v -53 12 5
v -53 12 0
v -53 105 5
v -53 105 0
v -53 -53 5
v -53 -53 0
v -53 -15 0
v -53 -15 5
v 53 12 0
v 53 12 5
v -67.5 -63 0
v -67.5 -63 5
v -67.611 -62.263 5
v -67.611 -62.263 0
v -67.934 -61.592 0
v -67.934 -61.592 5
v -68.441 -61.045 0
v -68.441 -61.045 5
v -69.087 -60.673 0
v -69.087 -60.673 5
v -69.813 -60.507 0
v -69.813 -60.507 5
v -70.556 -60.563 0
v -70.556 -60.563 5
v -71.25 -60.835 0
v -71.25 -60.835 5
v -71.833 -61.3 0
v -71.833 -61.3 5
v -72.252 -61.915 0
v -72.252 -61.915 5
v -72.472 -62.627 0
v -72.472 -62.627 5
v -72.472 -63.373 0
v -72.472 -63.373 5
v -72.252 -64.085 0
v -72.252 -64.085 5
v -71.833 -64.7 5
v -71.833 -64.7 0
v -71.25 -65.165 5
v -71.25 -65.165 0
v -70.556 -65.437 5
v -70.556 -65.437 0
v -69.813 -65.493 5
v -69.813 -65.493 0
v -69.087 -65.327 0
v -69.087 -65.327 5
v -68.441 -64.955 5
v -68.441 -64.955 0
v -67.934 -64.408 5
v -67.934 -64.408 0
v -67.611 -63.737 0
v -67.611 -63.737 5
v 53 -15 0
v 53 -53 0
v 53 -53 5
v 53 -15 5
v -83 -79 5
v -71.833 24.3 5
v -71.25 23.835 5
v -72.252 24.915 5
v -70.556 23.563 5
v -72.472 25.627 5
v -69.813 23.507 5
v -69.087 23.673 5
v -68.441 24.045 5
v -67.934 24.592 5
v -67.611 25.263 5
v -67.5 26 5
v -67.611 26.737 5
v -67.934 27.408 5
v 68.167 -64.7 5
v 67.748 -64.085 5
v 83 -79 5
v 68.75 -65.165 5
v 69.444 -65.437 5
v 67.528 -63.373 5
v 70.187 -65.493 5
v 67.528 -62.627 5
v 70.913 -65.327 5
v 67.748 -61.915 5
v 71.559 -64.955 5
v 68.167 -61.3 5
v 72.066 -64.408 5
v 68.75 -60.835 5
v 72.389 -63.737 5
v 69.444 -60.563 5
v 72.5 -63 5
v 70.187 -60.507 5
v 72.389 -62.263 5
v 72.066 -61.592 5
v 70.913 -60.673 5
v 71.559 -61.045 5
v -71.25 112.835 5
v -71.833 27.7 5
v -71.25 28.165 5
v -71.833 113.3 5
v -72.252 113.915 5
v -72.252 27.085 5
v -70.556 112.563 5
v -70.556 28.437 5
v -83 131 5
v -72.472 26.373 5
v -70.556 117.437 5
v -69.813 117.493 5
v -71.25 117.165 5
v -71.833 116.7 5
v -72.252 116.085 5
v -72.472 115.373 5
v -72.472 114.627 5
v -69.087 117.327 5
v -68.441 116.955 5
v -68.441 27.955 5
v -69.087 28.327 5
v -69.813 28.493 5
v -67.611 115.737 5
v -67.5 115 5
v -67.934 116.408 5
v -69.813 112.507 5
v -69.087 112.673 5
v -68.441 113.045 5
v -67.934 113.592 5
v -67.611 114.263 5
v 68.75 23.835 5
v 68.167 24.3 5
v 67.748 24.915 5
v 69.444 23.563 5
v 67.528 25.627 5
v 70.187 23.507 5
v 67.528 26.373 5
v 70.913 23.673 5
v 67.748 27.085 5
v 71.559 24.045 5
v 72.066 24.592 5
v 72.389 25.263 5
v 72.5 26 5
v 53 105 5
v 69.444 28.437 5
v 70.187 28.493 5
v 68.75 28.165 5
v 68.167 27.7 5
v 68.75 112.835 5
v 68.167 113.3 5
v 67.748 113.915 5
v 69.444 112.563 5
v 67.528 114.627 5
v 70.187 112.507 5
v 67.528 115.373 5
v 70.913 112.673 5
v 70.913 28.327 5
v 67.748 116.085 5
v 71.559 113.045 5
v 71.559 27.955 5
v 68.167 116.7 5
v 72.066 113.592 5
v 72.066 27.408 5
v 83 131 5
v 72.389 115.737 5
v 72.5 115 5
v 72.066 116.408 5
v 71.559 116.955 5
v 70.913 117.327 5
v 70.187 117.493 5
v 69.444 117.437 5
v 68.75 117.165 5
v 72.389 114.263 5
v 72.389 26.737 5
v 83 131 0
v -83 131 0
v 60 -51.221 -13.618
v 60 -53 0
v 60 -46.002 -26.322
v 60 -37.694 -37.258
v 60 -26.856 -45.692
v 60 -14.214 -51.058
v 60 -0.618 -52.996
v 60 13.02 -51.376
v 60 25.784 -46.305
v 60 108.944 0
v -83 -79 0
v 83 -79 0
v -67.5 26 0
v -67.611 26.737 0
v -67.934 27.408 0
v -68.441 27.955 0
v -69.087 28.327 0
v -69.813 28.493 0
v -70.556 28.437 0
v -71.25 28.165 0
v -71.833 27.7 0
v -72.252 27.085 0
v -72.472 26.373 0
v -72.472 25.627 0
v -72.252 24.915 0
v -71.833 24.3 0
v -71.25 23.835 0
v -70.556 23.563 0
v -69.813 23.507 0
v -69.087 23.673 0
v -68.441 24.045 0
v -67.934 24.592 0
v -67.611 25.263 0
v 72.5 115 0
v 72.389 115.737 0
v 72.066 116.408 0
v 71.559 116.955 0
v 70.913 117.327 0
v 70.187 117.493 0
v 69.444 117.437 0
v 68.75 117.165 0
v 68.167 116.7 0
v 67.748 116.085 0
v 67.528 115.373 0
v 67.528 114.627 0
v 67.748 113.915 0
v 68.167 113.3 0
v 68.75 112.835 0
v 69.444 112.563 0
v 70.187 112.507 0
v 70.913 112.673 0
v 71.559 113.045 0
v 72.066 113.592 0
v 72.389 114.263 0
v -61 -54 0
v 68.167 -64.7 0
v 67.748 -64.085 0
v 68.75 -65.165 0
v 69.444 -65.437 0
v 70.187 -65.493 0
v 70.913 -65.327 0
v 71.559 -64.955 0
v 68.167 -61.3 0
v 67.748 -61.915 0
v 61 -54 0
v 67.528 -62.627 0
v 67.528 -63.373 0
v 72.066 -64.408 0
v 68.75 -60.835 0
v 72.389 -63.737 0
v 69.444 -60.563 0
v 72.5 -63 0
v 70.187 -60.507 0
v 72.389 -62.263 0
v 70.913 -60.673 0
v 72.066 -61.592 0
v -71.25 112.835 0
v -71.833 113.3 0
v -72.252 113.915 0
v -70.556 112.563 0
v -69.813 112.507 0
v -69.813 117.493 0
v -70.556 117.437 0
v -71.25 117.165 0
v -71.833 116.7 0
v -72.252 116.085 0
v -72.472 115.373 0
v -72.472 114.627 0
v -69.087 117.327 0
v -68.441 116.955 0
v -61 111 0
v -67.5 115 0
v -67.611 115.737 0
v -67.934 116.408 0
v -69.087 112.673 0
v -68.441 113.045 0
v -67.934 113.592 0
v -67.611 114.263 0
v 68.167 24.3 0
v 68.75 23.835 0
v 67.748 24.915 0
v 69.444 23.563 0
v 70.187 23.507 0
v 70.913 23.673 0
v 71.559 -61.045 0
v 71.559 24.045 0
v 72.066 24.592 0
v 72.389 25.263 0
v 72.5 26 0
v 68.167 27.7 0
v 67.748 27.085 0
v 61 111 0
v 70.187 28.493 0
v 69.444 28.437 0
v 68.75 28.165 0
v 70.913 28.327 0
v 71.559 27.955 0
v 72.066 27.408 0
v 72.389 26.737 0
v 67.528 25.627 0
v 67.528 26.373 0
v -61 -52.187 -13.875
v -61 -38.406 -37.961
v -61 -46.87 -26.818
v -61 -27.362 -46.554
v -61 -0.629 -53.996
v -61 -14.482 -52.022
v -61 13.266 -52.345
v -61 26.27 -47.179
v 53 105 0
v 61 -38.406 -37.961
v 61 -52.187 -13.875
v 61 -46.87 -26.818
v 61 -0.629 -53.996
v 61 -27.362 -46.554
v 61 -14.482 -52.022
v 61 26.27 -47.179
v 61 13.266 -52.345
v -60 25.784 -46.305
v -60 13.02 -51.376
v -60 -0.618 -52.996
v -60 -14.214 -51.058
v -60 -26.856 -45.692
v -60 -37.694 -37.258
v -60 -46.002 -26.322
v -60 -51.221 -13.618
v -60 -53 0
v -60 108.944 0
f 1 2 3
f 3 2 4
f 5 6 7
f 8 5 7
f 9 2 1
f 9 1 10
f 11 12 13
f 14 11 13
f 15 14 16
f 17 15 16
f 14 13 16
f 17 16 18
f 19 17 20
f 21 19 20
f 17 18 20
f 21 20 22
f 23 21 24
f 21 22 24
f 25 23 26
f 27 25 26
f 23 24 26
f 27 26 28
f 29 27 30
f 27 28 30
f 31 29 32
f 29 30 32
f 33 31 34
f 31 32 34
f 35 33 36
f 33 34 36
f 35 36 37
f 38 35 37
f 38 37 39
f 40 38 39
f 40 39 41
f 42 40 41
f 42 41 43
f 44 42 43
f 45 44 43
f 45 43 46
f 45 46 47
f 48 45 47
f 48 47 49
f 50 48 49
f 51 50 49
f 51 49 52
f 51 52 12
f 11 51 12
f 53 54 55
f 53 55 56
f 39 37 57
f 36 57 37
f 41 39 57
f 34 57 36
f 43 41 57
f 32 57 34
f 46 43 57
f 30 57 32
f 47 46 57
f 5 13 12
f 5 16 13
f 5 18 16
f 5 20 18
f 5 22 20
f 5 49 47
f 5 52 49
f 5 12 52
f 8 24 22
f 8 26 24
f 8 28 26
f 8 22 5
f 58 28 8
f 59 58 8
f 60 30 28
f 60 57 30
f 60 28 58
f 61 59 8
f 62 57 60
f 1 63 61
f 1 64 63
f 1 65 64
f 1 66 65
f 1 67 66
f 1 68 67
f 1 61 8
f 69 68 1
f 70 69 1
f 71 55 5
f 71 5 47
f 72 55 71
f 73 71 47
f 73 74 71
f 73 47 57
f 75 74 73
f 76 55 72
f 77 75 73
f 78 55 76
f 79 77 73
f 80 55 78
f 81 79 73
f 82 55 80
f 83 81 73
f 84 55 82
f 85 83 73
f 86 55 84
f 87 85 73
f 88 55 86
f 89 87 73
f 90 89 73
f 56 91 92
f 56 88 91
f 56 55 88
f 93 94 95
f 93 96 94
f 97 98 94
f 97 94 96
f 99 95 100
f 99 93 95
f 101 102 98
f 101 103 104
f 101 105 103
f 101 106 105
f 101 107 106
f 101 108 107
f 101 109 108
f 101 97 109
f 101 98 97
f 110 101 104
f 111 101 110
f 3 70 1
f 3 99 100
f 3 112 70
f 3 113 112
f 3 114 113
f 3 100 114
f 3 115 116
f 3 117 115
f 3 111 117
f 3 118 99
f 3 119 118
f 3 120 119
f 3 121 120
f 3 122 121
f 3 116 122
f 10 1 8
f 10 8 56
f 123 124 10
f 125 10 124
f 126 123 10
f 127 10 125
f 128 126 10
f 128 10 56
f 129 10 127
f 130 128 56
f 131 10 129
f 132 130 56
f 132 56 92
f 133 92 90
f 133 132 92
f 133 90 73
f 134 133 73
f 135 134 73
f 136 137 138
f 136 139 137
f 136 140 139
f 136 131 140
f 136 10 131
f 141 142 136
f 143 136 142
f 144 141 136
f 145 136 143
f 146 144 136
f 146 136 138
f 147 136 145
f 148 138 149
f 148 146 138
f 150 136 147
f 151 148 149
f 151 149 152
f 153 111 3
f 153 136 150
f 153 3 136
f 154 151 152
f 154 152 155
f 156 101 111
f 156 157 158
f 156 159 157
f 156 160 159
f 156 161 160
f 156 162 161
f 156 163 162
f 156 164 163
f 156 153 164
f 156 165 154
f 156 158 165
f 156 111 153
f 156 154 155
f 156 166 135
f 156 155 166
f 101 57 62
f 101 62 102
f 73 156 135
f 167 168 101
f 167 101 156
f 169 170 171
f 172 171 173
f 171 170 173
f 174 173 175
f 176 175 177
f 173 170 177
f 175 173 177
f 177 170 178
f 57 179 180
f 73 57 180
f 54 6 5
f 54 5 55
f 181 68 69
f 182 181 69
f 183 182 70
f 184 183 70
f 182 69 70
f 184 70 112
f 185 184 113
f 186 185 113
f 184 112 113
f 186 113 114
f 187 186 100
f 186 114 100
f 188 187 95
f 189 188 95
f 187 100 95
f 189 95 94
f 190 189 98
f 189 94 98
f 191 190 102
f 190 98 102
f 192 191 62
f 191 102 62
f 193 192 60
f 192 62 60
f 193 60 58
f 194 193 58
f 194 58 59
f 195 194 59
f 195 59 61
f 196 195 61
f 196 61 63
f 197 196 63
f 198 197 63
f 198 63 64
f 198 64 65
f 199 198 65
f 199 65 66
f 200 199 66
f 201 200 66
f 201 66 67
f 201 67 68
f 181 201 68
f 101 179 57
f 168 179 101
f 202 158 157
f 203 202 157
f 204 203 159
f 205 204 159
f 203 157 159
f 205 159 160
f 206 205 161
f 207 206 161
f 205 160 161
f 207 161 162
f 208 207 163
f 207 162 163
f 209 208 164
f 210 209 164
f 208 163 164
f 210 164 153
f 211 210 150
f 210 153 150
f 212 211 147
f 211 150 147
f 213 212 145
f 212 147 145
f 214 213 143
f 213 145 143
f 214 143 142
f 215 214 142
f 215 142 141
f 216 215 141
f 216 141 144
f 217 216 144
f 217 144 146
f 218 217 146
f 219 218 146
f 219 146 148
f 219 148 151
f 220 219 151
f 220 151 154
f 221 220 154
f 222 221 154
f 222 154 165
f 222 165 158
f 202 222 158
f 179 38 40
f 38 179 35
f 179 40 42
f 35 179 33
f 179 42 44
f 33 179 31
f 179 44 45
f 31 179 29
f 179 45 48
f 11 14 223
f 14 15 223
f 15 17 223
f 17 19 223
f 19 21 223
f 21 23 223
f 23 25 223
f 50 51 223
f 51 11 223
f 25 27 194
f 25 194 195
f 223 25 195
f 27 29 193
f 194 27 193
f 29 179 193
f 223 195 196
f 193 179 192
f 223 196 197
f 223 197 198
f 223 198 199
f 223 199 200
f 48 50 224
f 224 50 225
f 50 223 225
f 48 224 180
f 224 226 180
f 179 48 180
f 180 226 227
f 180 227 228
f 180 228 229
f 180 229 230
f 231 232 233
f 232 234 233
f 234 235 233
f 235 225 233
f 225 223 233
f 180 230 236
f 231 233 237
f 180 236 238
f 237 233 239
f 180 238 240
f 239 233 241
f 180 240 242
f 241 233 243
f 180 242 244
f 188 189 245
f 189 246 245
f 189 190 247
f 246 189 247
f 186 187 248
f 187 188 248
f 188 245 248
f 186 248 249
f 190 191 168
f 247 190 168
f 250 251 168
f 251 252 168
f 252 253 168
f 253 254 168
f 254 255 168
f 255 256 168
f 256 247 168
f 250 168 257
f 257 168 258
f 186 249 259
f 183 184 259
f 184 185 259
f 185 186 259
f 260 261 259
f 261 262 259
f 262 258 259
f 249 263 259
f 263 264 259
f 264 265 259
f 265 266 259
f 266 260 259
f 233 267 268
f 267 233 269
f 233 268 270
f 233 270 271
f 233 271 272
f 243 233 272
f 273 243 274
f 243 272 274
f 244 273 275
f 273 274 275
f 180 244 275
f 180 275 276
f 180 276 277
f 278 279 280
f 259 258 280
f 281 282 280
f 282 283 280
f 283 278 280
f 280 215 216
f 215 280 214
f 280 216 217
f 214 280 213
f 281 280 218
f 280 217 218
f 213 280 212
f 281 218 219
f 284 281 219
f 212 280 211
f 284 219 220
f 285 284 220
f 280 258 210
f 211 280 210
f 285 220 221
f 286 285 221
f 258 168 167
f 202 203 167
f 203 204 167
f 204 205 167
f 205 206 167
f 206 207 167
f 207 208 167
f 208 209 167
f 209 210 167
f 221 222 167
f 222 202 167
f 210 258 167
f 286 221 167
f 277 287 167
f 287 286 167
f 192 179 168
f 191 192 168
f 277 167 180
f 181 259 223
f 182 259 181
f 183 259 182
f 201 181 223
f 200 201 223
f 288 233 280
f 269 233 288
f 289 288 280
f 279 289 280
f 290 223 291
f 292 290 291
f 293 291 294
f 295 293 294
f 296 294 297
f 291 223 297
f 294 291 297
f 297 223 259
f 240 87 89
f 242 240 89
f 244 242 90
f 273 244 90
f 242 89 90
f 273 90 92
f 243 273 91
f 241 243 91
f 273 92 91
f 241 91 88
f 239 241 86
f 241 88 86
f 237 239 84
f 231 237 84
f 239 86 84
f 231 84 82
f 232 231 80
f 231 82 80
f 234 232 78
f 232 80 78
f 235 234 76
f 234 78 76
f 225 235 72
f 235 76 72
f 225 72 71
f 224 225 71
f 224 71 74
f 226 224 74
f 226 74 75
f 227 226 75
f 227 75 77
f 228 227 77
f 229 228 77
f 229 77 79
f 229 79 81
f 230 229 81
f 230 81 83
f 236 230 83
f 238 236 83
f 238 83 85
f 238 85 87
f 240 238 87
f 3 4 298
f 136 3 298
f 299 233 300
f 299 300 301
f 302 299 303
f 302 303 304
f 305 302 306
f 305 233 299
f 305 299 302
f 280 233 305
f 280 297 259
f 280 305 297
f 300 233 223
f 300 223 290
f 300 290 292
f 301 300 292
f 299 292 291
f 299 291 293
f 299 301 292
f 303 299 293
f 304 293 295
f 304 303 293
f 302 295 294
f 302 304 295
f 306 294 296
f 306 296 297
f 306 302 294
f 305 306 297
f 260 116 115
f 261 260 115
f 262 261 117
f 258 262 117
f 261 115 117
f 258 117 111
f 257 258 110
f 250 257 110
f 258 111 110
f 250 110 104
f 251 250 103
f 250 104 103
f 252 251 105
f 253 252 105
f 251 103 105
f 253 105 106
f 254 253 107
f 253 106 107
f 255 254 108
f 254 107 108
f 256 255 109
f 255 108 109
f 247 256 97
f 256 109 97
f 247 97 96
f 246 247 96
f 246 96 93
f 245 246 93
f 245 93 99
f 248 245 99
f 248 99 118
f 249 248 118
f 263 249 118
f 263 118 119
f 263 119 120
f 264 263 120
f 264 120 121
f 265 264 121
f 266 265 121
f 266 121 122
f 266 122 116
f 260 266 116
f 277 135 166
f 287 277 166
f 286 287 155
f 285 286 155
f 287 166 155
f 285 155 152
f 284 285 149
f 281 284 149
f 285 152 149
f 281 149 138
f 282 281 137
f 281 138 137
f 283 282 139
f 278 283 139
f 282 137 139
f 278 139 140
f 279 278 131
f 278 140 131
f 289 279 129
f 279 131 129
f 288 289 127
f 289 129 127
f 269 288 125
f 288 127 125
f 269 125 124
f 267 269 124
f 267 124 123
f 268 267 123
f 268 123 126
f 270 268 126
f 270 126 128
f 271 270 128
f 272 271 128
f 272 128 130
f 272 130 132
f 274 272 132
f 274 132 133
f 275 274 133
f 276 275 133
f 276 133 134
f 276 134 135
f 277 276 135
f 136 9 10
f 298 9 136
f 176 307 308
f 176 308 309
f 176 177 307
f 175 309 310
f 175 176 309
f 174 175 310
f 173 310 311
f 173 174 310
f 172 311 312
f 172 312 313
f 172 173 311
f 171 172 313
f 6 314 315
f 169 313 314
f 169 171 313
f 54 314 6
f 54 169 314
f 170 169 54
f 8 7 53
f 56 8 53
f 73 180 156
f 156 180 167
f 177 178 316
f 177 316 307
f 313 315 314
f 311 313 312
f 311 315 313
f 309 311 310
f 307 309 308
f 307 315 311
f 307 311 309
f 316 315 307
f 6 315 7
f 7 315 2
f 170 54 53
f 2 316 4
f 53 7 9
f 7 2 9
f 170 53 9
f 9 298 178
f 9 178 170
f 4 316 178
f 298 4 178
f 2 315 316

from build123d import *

# Parameters (mm, degrees)
EXTRU_MINCE1_DEPTH      = 60
BOSS_EXTRU_1_START      = 1
BOSS_EXTRU_1_DEPTH      = 1
BOSS_EXTRU_2_DEPTH      = 1
ESQUISSE4_W             = 166
ESQUISSE4_H             = 210
ESQUISSE4_W_2           = 106
ESQUISSE4_H_2           = 93
ESQUISSE4_H_3           = 38
BOSS_EXTRU_3_DEPTH      = 5
ESQUISSE5_R             = 2.5
ENL_V_MAT_EXTRU_1_DEPTH = 166.924681708


with BuildPart() as part:
    # Esquisse1 → Extru.-Mince1 (new, symmetric)
    with BuildSketch(Plane(origin=(0, 0, 0), x_dir=(0, 0, -1), z_dir=(1, 0, 0))):
        with BuildLine():
            ThreePointArc((0, -54), (46.554240379, -27.362432324), (47.179157474, 26.27027027))
            Line((47.179157474, 26.27027027), (0, 111))
            Line((0, 111), (-0.873688101, 110.513513514))
            Line((-0.873688101, 110.513513514), (46.305469372, 25.783783784))
            ThreePointArc((46.305469372, 25.783783784), (45.692124817, -26.855720615), (0, -53))
            Line((0, -53), (0, -54))
        make_face()
    extrude(amount=EXTRU_MINCE1_DEPTH, both=True)

    # Esquisse2 → Boss.-Extru.1 (add)
    with BuildSketch(Plane(origin=(60, 0, 0), x_dir=(0, 0, -1), z_dir=(1, 0, 0)).offset(BOSS_EXTRU_1_START)):
        with BuildLine():
            Line((0, 111), (0, -54))
            ThreePointArc((0, -54), (46.554240379, -27.362432324), (47.179157474, 26.27027027))
            Line((47.179157474, 26.27027027), (0, 111))
        make_face()
    extrude(amount=-BOSS_EXTRU_1_DEPTH)

    # Esquisse3 → Boss.-Extru.2 (add)
    with BuildSketch(Plane.ZY.offset(60)):
        with BuildLine():
            Line((0, 111), (0, -54))
            ThreePointArc((0, -54), (-46.554240379, -27.362432324), (-47.179157474, 26.27027027))
            Line((-47.179157474, 26.27027027), (0, 111))
        make_face()
    extrude(amount=BOSS_EXTRU_2_DEPTH)

    # Esquisse4 → Boss.-Extru.3 (add)
    with BuildSketch(Plane.XY):
        with Locations((0, 26)):
            Rectangle(ESQUISSE4_W, ESQUISSE4_H)
        with Locations((0, 58.5)):
            Rectangle(ESQUISSE4_W_2, ESQUISSE4_H_2, mode=Mode.SUBTRACT)
        with Locations((0, -34)):
            Rectangle(ESQUISSE4_W_2, ESQUISSE4_H_3, mode=Mode.SUBTRACT)
    extrude(amount=BOSS_EXTRU_3_DEPTH)

    # Esquisse5 → Enlèv. mat.-Extru.1 (cut, through all)
    with BuildSketch(Plane.XY.offset(5)):
        with Locations((-70, 115)):
            Circle(ESQUISSE5_R)
        with Locations((-70, 26)):
            Circle(ESQUISSE5_R)
        with Locations((-70, -63)):
            Circle(ESQUISSE5_R)
        with Locations((70, -63)):
            Circle(ESQUISSE5_R)
        with Locations((70, 26)):
            Circle(ESQUISSE5_R)
        with Locations((70, 115)):
            Circle(ESQUISSE5_R)
    extrude(amount=-ENL_V_MAT_EXTRU_1_DEPTH, mode=Mode.SUBTRACT)


solid = part.part
